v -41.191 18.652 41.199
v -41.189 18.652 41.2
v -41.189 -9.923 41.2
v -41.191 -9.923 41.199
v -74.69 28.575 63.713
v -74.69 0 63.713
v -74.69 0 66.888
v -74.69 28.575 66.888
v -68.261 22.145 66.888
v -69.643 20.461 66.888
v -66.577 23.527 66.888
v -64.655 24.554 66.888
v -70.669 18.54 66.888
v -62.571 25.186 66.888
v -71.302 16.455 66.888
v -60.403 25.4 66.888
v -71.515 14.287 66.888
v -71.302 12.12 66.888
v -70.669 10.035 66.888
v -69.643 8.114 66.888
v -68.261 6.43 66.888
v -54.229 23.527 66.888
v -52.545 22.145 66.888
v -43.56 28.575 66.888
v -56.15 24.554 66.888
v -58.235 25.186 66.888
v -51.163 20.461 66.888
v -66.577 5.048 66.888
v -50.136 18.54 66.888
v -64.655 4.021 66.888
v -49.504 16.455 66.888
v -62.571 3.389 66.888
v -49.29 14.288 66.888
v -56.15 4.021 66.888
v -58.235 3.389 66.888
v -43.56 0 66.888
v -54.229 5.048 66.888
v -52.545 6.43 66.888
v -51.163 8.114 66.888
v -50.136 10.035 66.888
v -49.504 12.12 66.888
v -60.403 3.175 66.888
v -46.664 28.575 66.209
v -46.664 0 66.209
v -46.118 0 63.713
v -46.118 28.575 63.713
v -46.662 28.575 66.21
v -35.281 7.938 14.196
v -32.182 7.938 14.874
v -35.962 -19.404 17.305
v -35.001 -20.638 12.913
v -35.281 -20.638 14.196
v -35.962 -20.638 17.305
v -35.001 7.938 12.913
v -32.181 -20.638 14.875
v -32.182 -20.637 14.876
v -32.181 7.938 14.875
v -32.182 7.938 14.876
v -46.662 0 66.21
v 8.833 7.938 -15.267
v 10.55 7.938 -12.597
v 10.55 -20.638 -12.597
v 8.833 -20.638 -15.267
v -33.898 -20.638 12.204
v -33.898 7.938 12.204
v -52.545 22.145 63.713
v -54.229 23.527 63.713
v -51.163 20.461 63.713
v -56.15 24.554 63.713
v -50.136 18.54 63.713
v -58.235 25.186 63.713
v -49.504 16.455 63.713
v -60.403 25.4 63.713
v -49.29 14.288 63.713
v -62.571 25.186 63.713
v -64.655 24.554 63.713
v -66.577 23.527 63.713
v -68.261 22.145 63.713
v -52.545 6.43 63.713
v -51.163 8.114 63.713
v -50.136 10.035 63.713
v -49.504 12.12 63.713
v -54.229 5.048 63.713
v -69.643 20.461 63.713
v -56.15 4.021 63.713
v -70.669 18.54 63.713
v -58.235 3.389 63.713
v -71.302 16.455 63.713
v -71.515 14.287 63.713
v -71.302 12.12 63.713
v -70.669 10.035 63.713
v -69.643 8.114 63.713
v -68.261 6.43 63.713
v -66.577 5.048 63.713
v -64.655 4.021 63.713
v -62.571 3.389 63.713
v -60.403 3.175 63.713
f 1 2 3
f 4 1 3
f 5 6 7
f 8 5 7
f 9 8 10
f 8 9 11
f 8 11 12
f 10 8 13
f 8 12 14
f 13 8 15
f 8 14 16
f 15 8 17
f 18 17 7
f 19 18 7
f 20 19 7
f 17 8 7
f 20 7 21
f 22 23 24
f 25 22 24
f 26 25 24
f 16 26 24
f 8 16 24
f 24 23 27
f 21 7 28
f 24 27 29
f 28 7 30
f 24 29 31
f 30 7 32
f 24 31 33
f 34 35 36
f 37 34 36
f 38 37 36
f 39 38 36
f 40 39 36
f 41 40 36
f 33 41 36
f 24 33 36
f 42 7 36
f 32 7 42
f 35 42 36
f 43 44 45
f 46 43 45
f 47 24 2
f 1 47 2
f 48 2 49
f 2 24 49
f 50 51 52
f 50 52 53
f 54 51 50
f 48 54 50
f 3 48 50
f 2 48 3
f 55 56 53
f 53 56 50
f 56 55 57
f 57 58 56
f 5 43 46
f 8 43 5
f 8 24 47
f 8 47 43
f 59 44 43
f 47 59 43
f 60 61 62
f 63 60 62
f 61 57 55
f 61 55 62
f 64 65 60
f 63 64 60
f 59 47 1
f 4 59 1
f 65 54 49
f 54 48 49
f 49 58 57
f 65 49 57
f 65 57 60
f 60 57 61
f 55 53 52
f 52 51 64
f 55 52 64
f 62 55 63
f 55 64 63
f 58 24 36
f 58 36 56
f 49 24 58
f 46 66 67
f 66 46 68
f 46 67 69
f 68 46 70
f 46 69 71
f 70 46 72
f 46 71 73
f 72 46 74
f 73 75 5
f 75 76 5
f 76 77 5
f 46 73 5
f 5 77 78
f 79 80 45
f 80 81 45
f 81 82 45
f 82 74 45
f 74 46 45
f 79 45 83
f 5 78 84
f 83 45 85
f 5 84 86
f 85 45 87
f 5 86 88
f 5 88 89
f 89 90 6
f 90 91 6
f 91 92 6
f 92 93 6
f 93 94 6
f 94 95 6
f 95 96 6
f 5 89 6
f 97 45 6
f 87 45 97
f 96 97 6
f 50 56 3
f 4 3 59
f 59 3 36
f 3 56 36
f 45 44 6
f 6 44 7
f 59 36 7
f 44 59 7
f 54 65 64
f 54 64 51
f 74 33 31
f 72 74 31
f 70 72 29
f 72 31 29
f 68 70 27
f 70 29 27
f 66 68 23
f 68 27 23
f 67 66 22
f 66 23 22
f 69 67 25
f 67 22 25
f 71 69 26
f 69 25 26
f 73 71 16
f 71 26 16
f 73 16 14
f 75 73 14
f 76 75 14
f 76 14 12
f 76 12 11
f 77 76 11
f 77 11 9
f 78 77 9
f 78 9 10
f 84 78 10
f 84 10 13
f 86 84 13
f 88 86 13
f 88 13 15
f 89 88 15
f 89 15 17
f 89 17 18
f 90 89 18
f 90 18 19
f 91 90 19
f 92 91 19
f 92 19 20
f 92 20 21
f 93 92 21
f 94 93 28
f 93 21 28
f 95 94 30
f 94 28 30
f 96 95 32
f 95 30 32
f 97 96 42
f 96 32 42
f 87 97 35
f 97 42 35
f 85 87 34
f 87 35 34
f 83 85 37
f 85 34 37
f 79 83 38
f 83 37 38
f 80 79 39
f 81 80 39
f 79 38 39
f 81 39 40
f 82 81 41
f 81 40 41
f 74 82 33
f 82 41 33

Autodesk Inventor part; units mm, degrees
ref_plane "YZ Plane" through (0, 0, 0) normal (1, 0, 0) x (0, 1, 0)
ref_plane "XZ Plane" through (0, 0, 0) normal (0, 1, 0) x (-1, 0, 0)
ref_plane "XY Plane" through (0, 0, 0) normal (0, 0, 1) x (1, 0, 0)
sketch "Sketch1" plane through (0, 0, 0) normal (0, 1, 0) x (-1, 0, 0)
  line L0 (43.0137, 64.3915) -> (32.1817, 14.8739)
  line L1 (-10.5502, -12.5966) -> (-8.8333, -15.2673)
  line L2 (-8.8333, -15.2673) -> (35.0028, 12.913)
  line L3 (35.0028, 12.913) -> (46.1153, 63.713)
  line L4 (46.1153, 63.713) -> (43.0137, 64.3915)
  line L5 (-10.5502, -12.5966) -> (-10.5502, 12.913)
  line L6 (-10.5502, -12.5966) -> (32.1817, 14.8739)
  line L7 (46.1153, 63.713) -> (74.6903, 63.713)
  line L8 (74.6903, 63.713) -> (74.6903, 66.888)
  line L9 (74.6903, 66.888) -> (43.5598, 66.888)
  line L10 (43.0137, 64.3915) -> (43.5598, 66.888)
  point P0 (0, 0)
  dimension "d0" = 3.175
  dimension "d1" = 3.175
  dimension "d3" = 50.8
  dimension "d4" = 57.265
  dimension "d5" = 50.8
  dimension "d6" = 11.1125
  dimension "d7" = 28.575
  dimension "d8" = 3.175
extrude "Extrusion1" add sketch "Sketch1" along normal blind 28.575
sketch "Sketch2" plane through (-74.6903, 0, 66.888) normal (0, 0, 1) x (1, 0, 0)
  line L0 (28.575, 0) -> (0, 0) projected
  line L1 (0, 0) -> (0, 28.575) projected
  line L2 (28.575, 28.575) -> (0, 28.575) projected
  line L3 (28.575, 0) -> (28.575, 28.575) projected
  line L4 (28.575, 28.575) -> (0, 28.575) projected
  line L5 (0, 0) -> (0, 28.575) projected
  circle A0 centre (14.2875, 14.2875) radius 11.1125
  point P0 (74.6903, 0)
  point P1 (14.2875, 28.575)
  point P2 (0, 14.2875)
  dimension "d11" = 22.225
extrude "Extrusion2" cut sketch "Sketch2" against normal blind 28.575 contours A0
sketch "Sketch3" plane through (10.5502, 0, -12.5966) normal (0.5408, 0, 0.8412) x (0.8412, 0, -0.5408)
  line L0 (-50.8, 0) -> (-50.8, 28.575) projected
  line L1 (-50.8, 7.9375) -> (0, 7.9375)
  line L2 (0, 7.9375) -> (0, -20.6375)
  line L3 (0, -20.6375) -> (-50.8, -20.6375)
  line L4 (-50.8, -20.6375) -> (-50.8, 7.9375)
  line L5 (-50.8, 28.575) -> (0, 28.575) projected
  point P0 (-15.6863, 0)
  dimension "d14" = 50.8
  dimension "d15" = 28.575
  dimension "d16" = 20.6375
sketch "Sketch4" plane through (-32.1817, 0, 14.8739) normal (0.9769, 0, 0.2137) x (0.2137, 0, -0.9769)
  line L0 (-53.2441, 0) -> (-53.2441, 28.575) projected
  line L1 (-53.2441, 28.575) -> (0, 7.9375)
  line L2 (0, 0) -> (0, 28.575) projected
  line L3 (0, 7.9375) -> (0, -20.6375)
  line L4 (0, -20.6375) -> (-53.2441, 0)
  line L5 (-53.2441, 28.575) -> (-53.2441, 0)
  point P0 (21.4074, 0)
  dimension "d17" = 20.6375
  dimension "d18" = 28.575
sketch "Sketch5" plane through (-32.1817, 0, 14.8739) normal (0.9769, 0, 0.2137) x (0.2137, 0, -0.9769)
  line L0 (-53.2441, 41.9678) -> (42.8737, 41.9678)
  line L1 (42.8737, 41.9678) -> (42.8737, -28.4609)
  line L2 (42.8737, -28.4609) -> (-53.2441, -28.4609)
  line L3 (-53.2441, -28.4609) -> (-53.2441, 41.9678)
  point P0 (21.4074, 0)
extrude "Extrusion3" cut sketch "Sketch5" along normal blind 50.8 and the other way blind 3.175
extrude "Extrusion4" add sketch "Sketch4" against normal blind 3.175
extrude "Extrusion5" add sketch "Sketch3" against normal blind 3.175
sketch "Sketch6" plane through (8.8333, 0, -15.2673) normal (-0.5408, 0, -0.8412) x (-0.8412, 0, 0.5408)
  line L0 (50.8, 7.9375) -> (0, 7.9375) projected
  line L1 (50.8, 7.9375) -> (63.8738, 7.9375)
  line L2 (63.8738, 7.9375) -> (63.8738, -20.6375)
  line L3 (63.8738, -20.6375) -> (50.8, -20.6375)
  line L4 (50.8, -20.6375) -> (50.8, 7.9375)
  point P0 (15.6863, 0)
extrude "Extrusion6" add sketch "Sketch6" against normal blind 3.175
sketch "Sketch7" plane through (-35.2833, 0, 14.1954) normal (-0.9769, 0, -0.2137) x (-0.2137, 0, 0.9769)
  line L0 (50.6885, 27.5845) -> (0, 7.9375) projected
  line L1 (3.1832, -19.4037) -> (53.2441, 0) projected
  line L2 (0, 7.9375) -> (3.1832, 7.9375) projected
  line L3 (0, 7.9375) -> (-56.9759, -14.1465)
  line L4 (-56.9759, -14.1465) -> (-50.1301, -40.068)
  line L5 (53.2441, 0) -> (0, -20.6375) projected
  line L6 (-50.1301, -40.068) -> (0, -20.6375)
  line L7 (0, 7.9375) -> (-35.9676, 7.9375) projected
  line L8 (0, 7.9375) -> (0, -20.6375)
  line L9 (11.5155, 12.4009) -> (21.1446, -12.4418)
  line L10 (-34.1585, 31.8696) -> (27.6424, 31.8696)
  line L11 (27.6424, 31.8696) -> (27.6424, -37.0154)
  line L12 (27.6424, -37.0154) -> (-34.1585, -37.0154)
  line L13 (-34.1585, -37.0154) -> (-34.1585, 31.8696)
  point P0 (-21.4074, 0)
extrude "Extrusion7" cut sketch "Sketch7" along normal blind 25.4 contours L9 L1 L5 L8 L0 | L0 L7 L13 L10 L11 | L0 L11 L1 L9 | L8 L6 L13 L3 | L3 L13 L7 | L1 L11 L12 L13 L6 L5
properties part number "Spinner to Top"
